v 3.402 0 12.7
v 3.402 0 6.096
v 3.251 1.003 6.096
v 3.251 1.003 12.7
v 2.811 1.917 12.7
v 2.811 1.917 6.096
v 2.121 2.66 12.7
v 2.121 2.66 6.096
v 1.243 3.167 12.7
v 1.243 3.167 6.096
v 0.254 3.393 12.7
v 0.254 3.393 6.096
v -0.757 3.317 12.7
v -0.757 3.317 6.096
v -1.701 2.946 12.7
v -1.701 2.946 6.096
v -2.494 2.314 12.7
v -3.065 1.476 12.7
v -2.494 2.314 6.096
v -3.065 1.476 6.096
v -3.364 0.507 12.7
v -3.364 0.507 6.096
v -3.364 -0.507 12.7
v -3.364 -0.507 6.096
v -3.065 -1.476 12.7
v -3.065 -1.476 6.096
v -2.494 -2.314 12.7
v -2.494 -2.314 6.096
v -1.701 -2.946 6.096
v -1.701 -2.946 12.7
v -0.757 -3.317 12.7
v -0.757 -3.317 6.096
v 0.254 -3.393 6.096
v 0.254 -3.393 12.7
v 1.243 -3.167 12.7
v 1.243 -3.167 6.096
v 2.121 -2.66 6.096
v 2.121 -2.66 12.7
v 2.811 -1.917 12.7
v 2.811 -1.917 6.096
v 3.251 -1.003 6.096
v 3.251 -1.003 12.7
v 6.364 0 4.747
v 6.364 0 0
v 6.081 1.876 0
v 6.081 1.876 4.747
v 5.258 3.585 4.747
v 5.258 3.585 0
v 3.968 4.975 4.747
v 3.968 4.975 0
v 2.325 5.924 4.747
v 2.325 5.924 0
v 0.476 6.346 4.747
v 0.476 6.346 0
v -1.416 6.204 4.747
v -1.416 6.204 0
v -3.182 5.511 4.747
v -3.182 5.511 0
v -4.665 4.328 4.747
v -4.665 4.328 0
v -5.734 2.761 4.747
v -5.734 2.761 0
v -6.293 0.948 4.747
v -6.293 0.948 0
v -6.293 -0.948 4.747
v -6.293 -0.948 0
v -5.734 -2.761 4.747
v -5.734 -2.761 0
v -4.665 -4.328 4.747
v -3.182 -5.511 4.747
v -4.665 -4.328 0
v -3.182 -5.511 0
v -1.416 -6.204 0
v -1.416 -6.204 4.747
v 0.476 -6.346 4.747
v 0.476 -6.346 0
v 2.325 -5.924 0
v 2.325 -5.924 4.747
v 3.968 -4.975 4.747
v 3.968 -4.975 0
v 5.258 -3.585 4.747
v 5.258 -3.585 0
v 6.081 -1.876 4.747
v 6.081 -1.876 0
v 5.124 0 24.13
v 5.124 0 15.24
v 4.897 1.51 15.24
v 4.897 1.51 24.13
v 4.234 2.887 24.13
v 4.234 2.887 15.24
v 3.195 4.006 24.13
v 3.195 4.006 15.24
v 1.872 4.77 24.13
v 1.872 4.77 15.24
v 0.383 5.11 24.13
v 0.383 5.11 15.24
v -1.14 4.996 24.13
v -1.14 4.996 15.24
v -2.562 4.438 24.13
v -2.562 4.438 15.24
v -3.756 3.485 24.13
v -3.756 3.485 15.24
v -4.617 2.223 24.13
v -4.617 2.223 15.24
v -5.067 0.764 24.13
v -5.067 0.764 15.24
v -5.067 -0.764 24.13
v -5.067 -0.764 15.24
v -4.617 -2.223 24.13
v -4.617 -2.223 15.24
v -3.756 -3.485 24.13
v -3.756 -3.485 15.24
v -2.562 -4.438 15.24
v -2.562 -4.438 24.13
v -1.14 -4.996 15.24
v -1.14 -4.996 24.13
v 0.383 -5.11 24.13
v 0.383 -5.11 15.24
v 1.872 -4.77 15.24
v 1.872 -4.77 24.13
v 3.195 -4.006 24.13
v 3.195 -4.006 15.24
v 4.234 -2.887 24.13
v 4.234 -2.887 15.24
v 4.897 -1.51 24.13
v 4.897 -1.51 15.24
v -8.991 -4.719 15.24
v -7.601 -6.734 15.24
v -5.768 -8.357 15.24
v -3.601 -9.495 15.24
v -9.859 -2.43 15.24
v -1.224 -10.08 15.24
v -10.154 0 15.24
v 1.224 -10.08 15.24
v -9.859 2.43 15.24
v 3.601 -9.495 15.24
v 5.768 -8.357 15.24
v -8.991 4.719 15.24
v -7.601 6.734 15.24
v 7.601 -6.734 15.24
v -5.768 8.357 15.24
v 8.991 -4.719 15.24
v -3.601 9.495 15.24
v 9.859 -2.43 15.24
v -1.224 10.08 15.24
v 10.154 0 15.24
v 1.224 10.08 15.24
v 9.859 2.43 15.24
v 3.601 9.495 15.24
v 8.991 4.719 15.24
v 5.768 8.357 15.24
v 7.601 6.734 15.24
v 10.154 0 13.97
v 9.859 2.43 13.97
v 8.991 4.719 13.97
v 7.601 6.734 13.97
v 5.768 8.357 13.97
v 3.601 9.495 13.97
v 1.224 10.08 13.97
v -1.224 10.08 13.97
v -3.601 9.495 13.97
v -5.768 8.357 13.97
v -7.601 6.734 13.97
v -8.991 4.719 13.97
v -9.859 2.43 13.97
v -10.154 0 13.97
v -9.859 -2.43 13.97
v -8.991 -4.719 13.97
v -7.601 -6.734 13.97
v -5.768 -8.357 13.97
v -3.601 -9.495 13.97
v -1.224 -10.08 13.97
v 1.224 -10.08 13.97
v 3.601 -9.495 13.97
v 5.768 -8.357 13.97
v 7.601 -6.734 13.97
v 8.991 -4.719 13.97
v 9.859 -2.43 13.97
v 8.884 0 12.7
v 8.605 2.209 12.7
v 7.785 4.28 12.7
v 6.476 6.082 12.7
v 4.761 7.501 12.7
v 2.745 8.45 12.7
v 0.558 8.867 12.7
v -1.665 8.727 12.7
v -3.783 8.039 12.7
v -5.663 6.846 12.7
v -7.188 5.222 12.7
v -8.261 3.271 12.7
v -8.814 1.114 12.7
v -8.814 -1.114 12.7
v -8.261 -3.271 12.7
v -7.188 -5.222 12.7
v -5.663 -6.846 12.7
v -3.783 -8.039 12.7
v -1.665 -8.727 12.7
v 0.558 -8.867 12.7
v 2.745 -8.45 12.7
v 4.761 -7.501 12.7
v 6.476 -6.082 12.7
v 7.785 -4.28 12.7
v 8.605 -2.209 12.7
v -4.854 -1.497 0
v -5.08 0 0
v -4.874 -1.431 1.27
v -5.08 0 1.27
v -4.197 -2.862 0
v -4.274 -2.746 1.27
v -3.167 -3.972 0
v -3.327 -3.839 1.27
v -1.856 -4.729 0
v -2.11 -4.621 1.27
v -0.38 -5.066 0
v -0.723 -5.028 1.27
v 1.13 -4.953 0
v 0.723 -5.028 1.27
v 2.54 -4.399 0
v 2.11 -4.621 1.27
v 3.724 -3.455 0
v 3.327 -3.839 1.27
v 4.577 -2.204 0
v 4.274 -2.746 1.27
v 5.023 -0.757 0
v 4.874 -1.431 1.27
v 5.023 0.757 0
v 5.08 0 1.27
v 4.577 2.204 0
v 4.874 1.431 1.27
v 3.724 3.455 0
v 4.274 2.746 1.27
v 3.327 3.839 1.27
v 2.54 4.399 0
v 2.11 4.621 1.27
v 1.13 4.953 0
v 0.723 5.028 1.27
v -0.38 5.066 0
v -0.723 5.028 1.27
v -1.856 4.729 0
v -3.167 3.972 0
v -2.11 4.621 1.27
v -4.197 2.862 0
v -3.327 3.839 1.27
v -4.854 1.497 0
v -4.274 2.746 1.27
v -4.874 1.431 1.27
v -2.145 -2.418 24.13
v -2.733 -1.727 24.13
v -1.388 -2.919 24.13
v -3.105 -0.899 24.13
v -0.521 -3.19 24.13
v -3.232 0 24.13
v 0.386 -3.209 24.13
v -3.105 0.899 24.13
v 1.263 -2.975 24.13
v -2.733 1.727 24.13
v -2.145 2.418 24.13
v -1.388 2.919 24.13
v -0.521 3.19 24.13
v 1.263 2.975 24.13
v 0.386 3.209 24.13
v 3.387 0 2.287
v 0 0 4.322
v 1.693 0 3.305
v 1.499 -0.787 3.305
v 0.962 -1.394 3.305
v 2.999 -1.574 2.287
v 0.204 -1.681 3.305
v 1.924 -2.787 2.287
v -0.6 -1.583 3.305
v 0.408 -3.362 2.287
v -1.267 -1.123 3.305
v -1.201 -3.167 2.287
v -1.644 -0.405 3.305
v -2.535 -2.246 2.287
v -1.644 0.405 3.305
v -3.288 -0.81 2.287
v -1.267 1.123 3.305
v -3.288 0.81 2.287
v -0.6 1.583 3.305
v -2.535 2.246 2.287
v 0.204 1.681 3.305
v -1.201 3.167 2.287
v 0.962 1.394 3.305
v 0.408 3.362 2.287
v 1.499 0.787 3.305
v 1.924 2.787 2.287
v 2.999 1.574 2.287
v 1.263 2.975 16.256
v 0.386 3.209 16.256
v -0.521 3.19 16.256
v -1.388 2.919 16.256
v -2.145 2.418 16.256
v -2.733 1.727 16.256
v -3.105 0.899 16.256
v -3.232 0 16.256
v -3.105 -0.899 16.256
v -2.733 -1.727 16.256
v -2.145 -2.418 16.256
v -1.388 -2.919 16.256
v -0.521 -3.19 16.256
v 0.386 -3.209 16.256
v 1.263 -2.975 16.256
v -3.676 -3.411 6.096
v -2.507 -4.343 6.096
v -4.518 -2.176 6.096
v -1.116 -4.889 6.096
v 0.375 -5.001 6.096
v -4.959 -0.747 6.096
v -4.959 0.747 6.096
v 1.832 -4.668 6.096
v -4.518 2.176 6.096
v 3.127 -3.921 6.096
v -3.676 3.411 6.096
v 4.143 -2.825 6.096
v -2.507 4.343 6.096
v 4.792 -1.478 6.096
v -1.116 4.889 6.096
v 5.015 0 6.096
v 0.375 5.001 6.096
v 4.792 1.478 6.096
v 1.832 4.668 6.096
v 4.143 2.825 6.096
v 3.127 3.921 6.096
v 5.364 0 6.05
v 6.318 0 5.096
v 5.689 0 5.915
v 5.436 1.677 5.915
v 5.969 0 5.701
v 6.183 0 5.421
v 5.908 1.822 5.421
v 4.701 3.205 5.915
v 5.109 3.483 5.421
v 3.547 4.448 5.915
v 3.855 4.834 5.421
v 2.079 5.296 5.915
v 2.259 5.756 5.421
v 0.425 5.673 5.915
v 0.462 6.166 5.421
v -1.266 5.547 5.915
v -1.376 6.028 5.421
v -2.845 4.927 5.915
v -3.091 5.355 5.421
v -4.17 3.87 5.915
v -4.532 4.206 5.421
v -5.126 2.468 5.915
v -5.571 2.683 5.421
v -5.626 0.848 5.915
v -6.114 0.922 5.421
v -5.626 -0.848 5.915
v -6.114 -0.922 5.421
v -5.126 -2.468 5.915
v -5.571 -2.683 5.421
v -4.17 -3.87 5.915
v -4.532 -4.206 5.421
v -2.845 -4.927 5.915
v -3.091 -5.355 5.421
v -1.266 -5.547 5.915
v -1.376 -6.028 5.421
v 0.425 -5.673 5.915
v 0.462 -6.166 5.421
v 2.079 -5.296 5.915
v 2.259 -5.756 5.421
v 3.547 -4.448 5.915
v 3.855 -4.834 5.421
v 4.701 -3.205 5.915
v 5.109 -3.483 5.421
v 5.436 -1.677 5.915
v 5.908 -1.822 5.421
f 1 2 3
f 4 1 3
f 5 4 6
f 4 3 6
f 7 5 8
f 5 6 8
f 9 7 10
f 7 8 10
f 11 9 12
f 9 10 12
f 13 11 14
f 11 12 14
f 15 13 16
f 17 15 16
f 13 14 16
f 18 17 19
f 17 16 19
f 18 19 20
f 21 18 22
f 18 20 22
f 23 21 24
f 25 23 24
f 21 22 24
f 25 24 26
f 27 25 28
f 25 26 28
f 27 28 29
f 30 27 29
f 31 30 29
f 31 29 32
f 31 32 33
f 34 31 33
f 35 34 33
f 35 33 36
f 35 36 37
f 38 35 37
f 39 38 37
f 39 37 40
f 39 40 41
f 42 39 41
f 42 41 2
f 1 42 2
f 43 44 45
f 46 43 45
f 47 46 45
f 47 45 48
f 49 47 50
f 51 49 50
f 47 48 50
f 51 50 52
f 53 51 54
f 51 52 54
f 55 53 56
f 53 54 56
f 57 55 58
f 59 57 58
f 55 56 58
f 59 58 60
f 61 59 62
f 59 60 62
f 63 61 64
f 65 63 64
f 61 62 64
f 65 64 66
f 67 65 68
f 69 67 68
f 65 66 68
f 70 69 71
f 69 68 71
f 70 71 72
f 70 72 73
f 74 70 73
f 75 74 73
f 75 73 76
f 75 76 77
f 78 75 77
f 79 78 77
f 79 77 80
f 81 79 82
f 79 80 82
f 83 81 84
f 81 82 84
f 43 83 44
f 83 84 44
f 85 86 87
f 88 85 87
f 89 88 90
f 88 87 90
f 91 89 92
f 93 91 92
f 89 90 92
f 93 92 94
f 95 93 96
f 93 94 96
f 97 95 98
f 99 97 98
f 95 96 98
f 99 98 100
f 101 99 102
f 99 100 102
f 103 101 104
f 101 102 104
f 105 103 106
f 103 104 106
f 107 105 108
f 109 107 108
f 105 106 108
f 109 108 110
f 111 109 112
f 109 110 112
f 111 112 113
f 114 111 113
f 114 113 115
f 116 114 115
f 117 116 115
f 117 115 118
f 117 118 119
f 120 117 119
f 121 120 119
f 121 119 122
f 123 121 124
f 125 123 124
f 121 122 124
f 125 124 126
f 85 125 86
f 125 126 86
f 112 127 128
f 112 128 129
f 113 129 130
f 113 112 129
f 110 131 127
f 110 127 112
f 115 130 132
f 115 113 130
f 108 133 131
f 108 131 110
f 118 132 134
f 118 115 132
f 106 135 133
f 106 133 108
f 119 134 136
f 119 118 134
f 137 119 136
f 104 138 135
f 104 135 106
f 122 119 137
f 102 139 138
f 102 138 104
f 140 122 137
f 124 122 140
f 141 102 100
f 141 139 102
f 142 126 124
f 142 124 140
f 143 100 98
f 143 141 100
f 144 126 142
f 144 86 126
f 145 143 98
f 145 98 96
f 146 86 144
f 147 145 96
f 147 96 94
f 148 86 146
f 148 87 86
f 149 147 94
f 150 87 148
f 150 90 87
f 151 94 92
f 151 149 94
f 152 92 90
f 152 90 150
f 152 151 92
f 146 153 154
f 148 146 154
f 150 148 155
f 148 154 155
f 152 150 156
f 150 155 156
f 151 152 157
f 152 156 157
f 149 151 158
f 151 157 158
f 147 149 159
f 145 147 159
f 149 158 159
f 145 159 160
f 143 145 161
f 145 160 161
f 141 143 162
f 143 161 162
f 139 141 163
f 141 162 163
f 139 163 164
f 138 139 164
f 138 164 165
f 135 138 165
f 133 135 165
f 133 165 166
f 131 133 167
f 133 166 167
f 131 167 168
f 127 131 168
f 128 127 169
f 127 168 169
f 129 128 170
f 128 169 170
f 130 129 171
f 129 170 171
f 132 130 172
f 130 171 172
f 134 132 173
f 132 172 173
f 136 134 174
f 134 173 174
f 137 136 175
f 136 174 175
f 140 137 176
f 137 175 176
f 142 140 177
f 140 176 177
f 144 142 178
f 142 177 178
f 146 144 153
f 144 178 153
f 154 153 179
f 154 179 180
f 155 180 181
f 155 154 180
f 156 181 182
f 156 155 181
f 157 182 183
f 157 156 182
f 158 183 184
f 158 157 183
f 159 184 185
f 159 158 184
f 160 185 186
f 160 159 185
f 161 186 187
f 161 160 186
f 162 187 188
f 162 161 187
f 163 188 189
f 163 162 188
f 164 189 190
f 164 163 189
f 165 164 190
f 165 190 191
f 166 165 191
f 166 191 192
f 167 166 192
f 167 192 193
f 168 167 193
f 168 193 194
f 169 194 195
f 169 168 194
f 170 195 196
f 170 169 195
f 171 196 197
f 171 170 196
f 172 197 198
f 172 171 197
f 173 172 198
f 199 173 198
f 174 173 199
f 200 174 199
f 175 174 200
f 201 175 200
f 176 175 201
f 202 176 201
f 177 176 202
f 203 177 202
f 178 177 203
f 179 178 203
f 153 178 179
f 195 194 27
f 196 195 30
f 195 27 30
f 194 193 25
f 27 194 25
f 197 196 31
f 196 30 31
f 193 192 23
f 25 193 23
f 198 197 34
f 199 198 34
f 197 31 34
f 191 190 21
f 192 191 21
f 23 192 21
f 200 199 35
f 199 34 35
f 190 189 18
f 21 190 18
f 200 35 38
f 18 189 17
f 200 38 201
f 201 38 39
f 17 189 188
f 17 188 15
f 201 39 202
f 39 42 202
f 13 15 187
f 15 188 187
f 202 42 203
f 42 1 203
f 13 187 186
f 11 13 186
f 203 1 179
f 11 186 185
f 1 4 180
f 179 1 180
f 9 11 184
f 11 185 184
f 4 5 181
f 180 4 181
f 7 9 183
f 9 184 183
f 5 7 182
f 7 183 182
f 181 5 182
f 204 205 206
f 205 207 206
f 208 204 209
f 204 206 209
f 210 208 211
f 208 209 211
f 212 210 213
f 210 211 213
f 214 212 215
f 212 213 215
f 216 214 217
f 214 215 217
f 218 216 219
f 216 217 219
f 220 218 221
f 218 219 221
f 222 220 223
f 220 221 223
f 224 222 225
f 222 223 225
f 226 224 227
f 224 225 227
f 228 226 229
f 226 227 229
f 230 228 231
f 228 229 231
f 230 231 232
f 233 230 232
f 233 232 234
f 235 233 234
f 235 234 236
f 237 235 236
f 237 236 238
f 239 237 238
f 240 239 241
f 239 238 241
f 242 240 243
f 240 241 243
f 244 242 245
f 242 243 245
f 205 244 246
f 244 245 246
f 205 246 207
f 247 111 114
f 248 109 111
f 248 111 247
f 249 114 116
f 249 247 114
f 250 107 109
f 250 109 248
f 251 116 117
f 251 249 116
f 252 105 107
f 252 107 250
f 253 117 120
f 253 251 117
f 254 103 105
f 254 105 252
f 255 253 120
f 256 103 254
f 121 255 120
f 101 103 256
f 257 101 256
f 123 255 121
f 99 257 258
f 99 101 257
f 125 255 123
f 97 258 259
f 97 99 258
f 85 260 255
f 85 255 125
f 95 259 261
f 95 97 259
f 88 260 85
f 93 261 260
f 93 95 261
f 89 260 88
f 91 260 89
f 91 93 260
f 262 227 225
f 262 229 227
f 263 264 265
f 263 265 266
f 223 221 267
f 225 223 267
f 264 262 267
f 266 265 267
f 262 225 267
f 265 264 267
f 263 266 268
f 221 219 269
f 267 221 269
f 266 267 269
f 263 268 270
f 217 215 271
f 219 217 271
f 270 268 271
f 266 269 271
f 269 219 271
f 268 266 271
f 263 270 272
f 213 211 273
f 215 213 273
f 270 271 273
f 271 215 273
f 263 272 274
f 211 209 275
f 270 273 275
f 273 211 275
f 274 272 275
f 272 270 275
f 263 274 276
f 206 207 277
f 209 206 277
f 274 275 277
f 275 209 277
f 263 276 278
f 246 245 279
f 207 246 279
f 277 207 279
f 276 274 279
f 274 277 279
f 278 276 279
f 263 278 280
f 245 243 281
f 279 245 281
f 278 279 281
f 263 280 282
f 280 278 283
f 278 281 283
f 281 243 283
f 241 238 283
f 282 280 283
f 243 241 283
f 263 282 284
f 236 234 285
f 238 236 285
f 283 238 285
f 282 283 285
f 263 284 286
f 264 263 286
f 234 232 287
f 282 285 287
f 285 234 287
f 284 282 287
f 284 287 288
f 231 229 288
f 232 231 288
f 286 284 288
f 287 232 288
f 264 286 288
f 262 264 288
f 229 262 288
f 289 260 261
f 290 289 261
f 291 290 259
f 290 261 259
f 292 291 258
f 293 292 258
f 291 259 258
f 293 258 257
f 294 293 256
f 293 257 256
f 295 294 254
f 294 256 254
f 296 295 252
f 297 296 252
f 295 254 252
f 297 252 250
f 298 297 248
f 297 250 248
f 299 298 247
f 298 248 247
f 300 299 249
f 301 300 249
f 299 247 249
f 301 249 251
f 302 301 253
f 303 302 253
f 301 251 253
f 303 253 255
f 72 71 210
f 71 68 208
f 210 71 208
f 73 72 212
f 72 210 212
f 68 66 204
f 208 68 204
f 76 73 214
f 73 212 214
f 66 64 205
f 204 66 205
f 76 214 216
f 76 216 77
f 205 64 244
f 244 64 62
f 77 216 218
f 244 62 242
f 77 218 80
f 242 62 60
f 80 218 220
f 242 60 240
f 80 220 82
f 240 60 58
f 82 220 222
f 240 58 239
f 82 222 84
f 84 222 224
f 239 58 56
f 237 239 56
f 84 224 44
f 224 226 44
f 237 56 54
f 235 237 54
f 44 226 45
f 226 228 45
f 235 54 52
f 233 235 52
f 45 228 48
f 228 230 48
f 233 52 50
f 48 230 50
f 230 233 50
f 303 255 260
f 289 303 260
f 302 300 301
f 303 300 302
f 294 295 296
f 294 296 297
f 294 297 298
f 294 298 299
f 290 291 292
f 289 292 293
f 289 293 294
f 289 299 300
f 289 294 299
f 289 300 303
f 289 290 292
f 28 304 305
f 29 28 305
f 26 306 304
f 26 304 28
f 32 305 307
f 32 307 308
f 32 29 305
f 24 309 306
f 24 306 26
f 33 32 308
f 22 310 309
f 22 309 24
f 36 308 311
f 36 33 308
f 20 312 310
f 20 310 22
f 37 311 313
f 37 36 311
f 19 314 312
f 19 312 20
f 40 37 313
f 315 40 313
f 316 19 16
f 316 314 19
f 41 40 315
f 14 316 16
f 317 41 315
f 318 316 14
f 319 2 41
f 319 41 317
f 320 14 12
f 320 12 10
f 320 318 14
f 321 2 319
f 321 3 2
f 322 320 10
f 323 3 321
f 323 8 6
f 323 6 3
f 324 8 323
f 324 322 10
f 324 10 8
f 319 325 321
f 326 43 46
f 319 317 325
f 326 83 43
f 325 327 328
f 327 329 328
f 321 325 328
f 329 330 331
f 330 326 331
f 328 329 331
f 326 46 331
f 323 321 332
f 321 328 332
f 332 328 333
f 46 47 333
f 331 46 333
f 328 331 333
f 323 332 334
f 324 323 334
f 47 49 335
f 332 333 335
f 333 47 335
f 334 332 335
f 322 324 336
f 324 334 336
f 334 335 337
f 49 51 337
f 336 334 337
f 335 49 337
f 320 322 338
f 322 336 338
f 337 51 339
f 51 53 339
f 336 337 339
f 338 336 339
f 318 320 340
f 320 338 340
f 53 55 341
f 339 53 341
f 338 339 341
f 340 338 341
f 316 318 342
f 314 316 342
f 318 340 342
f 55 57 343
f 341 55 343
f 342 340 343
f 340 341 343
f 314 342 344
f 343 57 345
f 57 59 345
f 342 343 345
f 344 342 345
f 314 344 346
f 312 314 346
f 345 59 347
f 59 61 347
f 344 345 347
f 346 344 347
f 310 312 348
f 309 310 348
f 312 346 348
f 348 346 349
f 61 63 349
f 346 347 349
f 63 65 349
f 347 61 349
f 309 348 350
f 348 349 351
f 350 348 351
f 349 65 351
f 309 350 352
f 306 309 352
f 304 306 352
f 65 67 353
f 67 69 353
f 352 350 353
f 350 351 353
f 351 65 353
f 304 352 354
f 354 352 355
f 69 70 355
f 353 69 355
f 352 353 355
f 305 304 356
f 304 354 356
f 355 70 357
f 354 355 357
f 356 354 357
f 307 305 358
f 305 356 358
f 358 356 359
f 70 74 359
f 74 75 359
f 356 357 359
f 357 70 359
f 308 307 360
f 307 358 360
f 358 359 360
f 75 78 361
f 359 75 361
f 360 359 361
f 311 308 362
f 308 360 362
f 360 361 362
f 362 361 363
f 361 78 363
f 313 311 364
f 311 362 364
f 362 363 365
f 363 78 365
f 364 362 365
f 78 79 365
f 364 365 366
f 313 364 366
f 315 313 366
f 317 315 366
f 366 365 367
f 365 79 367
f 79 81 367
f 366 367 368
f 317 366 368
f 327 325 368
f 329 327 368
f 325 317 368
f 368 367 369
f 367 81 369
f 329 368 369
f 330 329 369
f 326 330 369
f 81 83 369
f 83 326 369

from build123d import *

# Parameters (mm, degrees)
F0_R      = 6.3637373436
F1_DEPTH  = 6.096
F2_R      = 3.4022099148
F3_DEPTH  = 12.7
F5_R      = 10.1544070979
F6_DEPTH  = 2.54
F8_R      = 5.1242922549
F9_DEPTH  = 8.89
F12_DEPTH = 7.874
F13_D     = 10.16
F13_DEPTH = 1.27
F13_TIP   = 3.0523719447
F14_R     = 1.3490625387
F15_SIZE  = 1.27


with BuildPart() as f1:
    # F0 (on Top) → F1 (new body)
    with BuildSketch(Plane.XY):
        Circle(F0_R)
    extrude(amount=F1_DEPTH)

    # F2 (on Top) → F3 (join)
    with BuildSketch(Plane.XY):
        Circle(F2_R)
    extrude(amount=F3_DEPTH)

    # F5 (on offset) → F6 (join)
    with BuildSketch(Plane.XY.offset(12.7)):
        Circle(F5_R)
    extrude(amount=F6_DEPTH)

    # F8 (on offset) → F9 (join)
    with BuildSketch(Plane.XY.offset(15.24)):
        Circle(F8_R)
    extrude(amount=F9_DEPTH)

    # F11 (on offset) → F12 (cut)
    with BuildSketch(Plane.XY.offset(24.13)):
        with BuildLine():
            Line((1.2634341, 0), (1.2634341, 2.9752182418))
            ThreePointArc((1.2634341, 2.9752182418), (-3.2323659, 0), (1.2634341, -2.9752182418))
            Line((1.2634341, -2.9752182418), (1.2634341, 0))
        make_face()
    extrude(amount=-F12_DEPTH, mode=Mode.SUBTRACT)

    # F13
    with Locations(Plane(origin=(0, 0, 0), x_dir=(1, 0, 0), z_dir=(0, 0, -1))):
        with Locations((0, 0)):
            Hole(F13_D / 2, depth=F13_DEPTH)
            with Locations((0, 0, -(F13_DEPTH + F13_TIP / 2))):  # 118° drill point
                Cone(0, F13_D / 2, F13_TIP, mode=Mode.SUBTRACT)

    # F14
    f14_edges = [f1.edges().sort_by_distance(p)[0] for p in [
        (-6.363737, 0, 6.096),
    ]]
    fillet(f14_edges, radius=F14_R)

    # F15
    f15_edges = [f1.edges().sort_by_distance(p)[0] for p in [
        (-10.154407, 0, 12.7),
    ]]
    chamfer(f15_edges, length=F15_SIZE)


solid = f1.part
